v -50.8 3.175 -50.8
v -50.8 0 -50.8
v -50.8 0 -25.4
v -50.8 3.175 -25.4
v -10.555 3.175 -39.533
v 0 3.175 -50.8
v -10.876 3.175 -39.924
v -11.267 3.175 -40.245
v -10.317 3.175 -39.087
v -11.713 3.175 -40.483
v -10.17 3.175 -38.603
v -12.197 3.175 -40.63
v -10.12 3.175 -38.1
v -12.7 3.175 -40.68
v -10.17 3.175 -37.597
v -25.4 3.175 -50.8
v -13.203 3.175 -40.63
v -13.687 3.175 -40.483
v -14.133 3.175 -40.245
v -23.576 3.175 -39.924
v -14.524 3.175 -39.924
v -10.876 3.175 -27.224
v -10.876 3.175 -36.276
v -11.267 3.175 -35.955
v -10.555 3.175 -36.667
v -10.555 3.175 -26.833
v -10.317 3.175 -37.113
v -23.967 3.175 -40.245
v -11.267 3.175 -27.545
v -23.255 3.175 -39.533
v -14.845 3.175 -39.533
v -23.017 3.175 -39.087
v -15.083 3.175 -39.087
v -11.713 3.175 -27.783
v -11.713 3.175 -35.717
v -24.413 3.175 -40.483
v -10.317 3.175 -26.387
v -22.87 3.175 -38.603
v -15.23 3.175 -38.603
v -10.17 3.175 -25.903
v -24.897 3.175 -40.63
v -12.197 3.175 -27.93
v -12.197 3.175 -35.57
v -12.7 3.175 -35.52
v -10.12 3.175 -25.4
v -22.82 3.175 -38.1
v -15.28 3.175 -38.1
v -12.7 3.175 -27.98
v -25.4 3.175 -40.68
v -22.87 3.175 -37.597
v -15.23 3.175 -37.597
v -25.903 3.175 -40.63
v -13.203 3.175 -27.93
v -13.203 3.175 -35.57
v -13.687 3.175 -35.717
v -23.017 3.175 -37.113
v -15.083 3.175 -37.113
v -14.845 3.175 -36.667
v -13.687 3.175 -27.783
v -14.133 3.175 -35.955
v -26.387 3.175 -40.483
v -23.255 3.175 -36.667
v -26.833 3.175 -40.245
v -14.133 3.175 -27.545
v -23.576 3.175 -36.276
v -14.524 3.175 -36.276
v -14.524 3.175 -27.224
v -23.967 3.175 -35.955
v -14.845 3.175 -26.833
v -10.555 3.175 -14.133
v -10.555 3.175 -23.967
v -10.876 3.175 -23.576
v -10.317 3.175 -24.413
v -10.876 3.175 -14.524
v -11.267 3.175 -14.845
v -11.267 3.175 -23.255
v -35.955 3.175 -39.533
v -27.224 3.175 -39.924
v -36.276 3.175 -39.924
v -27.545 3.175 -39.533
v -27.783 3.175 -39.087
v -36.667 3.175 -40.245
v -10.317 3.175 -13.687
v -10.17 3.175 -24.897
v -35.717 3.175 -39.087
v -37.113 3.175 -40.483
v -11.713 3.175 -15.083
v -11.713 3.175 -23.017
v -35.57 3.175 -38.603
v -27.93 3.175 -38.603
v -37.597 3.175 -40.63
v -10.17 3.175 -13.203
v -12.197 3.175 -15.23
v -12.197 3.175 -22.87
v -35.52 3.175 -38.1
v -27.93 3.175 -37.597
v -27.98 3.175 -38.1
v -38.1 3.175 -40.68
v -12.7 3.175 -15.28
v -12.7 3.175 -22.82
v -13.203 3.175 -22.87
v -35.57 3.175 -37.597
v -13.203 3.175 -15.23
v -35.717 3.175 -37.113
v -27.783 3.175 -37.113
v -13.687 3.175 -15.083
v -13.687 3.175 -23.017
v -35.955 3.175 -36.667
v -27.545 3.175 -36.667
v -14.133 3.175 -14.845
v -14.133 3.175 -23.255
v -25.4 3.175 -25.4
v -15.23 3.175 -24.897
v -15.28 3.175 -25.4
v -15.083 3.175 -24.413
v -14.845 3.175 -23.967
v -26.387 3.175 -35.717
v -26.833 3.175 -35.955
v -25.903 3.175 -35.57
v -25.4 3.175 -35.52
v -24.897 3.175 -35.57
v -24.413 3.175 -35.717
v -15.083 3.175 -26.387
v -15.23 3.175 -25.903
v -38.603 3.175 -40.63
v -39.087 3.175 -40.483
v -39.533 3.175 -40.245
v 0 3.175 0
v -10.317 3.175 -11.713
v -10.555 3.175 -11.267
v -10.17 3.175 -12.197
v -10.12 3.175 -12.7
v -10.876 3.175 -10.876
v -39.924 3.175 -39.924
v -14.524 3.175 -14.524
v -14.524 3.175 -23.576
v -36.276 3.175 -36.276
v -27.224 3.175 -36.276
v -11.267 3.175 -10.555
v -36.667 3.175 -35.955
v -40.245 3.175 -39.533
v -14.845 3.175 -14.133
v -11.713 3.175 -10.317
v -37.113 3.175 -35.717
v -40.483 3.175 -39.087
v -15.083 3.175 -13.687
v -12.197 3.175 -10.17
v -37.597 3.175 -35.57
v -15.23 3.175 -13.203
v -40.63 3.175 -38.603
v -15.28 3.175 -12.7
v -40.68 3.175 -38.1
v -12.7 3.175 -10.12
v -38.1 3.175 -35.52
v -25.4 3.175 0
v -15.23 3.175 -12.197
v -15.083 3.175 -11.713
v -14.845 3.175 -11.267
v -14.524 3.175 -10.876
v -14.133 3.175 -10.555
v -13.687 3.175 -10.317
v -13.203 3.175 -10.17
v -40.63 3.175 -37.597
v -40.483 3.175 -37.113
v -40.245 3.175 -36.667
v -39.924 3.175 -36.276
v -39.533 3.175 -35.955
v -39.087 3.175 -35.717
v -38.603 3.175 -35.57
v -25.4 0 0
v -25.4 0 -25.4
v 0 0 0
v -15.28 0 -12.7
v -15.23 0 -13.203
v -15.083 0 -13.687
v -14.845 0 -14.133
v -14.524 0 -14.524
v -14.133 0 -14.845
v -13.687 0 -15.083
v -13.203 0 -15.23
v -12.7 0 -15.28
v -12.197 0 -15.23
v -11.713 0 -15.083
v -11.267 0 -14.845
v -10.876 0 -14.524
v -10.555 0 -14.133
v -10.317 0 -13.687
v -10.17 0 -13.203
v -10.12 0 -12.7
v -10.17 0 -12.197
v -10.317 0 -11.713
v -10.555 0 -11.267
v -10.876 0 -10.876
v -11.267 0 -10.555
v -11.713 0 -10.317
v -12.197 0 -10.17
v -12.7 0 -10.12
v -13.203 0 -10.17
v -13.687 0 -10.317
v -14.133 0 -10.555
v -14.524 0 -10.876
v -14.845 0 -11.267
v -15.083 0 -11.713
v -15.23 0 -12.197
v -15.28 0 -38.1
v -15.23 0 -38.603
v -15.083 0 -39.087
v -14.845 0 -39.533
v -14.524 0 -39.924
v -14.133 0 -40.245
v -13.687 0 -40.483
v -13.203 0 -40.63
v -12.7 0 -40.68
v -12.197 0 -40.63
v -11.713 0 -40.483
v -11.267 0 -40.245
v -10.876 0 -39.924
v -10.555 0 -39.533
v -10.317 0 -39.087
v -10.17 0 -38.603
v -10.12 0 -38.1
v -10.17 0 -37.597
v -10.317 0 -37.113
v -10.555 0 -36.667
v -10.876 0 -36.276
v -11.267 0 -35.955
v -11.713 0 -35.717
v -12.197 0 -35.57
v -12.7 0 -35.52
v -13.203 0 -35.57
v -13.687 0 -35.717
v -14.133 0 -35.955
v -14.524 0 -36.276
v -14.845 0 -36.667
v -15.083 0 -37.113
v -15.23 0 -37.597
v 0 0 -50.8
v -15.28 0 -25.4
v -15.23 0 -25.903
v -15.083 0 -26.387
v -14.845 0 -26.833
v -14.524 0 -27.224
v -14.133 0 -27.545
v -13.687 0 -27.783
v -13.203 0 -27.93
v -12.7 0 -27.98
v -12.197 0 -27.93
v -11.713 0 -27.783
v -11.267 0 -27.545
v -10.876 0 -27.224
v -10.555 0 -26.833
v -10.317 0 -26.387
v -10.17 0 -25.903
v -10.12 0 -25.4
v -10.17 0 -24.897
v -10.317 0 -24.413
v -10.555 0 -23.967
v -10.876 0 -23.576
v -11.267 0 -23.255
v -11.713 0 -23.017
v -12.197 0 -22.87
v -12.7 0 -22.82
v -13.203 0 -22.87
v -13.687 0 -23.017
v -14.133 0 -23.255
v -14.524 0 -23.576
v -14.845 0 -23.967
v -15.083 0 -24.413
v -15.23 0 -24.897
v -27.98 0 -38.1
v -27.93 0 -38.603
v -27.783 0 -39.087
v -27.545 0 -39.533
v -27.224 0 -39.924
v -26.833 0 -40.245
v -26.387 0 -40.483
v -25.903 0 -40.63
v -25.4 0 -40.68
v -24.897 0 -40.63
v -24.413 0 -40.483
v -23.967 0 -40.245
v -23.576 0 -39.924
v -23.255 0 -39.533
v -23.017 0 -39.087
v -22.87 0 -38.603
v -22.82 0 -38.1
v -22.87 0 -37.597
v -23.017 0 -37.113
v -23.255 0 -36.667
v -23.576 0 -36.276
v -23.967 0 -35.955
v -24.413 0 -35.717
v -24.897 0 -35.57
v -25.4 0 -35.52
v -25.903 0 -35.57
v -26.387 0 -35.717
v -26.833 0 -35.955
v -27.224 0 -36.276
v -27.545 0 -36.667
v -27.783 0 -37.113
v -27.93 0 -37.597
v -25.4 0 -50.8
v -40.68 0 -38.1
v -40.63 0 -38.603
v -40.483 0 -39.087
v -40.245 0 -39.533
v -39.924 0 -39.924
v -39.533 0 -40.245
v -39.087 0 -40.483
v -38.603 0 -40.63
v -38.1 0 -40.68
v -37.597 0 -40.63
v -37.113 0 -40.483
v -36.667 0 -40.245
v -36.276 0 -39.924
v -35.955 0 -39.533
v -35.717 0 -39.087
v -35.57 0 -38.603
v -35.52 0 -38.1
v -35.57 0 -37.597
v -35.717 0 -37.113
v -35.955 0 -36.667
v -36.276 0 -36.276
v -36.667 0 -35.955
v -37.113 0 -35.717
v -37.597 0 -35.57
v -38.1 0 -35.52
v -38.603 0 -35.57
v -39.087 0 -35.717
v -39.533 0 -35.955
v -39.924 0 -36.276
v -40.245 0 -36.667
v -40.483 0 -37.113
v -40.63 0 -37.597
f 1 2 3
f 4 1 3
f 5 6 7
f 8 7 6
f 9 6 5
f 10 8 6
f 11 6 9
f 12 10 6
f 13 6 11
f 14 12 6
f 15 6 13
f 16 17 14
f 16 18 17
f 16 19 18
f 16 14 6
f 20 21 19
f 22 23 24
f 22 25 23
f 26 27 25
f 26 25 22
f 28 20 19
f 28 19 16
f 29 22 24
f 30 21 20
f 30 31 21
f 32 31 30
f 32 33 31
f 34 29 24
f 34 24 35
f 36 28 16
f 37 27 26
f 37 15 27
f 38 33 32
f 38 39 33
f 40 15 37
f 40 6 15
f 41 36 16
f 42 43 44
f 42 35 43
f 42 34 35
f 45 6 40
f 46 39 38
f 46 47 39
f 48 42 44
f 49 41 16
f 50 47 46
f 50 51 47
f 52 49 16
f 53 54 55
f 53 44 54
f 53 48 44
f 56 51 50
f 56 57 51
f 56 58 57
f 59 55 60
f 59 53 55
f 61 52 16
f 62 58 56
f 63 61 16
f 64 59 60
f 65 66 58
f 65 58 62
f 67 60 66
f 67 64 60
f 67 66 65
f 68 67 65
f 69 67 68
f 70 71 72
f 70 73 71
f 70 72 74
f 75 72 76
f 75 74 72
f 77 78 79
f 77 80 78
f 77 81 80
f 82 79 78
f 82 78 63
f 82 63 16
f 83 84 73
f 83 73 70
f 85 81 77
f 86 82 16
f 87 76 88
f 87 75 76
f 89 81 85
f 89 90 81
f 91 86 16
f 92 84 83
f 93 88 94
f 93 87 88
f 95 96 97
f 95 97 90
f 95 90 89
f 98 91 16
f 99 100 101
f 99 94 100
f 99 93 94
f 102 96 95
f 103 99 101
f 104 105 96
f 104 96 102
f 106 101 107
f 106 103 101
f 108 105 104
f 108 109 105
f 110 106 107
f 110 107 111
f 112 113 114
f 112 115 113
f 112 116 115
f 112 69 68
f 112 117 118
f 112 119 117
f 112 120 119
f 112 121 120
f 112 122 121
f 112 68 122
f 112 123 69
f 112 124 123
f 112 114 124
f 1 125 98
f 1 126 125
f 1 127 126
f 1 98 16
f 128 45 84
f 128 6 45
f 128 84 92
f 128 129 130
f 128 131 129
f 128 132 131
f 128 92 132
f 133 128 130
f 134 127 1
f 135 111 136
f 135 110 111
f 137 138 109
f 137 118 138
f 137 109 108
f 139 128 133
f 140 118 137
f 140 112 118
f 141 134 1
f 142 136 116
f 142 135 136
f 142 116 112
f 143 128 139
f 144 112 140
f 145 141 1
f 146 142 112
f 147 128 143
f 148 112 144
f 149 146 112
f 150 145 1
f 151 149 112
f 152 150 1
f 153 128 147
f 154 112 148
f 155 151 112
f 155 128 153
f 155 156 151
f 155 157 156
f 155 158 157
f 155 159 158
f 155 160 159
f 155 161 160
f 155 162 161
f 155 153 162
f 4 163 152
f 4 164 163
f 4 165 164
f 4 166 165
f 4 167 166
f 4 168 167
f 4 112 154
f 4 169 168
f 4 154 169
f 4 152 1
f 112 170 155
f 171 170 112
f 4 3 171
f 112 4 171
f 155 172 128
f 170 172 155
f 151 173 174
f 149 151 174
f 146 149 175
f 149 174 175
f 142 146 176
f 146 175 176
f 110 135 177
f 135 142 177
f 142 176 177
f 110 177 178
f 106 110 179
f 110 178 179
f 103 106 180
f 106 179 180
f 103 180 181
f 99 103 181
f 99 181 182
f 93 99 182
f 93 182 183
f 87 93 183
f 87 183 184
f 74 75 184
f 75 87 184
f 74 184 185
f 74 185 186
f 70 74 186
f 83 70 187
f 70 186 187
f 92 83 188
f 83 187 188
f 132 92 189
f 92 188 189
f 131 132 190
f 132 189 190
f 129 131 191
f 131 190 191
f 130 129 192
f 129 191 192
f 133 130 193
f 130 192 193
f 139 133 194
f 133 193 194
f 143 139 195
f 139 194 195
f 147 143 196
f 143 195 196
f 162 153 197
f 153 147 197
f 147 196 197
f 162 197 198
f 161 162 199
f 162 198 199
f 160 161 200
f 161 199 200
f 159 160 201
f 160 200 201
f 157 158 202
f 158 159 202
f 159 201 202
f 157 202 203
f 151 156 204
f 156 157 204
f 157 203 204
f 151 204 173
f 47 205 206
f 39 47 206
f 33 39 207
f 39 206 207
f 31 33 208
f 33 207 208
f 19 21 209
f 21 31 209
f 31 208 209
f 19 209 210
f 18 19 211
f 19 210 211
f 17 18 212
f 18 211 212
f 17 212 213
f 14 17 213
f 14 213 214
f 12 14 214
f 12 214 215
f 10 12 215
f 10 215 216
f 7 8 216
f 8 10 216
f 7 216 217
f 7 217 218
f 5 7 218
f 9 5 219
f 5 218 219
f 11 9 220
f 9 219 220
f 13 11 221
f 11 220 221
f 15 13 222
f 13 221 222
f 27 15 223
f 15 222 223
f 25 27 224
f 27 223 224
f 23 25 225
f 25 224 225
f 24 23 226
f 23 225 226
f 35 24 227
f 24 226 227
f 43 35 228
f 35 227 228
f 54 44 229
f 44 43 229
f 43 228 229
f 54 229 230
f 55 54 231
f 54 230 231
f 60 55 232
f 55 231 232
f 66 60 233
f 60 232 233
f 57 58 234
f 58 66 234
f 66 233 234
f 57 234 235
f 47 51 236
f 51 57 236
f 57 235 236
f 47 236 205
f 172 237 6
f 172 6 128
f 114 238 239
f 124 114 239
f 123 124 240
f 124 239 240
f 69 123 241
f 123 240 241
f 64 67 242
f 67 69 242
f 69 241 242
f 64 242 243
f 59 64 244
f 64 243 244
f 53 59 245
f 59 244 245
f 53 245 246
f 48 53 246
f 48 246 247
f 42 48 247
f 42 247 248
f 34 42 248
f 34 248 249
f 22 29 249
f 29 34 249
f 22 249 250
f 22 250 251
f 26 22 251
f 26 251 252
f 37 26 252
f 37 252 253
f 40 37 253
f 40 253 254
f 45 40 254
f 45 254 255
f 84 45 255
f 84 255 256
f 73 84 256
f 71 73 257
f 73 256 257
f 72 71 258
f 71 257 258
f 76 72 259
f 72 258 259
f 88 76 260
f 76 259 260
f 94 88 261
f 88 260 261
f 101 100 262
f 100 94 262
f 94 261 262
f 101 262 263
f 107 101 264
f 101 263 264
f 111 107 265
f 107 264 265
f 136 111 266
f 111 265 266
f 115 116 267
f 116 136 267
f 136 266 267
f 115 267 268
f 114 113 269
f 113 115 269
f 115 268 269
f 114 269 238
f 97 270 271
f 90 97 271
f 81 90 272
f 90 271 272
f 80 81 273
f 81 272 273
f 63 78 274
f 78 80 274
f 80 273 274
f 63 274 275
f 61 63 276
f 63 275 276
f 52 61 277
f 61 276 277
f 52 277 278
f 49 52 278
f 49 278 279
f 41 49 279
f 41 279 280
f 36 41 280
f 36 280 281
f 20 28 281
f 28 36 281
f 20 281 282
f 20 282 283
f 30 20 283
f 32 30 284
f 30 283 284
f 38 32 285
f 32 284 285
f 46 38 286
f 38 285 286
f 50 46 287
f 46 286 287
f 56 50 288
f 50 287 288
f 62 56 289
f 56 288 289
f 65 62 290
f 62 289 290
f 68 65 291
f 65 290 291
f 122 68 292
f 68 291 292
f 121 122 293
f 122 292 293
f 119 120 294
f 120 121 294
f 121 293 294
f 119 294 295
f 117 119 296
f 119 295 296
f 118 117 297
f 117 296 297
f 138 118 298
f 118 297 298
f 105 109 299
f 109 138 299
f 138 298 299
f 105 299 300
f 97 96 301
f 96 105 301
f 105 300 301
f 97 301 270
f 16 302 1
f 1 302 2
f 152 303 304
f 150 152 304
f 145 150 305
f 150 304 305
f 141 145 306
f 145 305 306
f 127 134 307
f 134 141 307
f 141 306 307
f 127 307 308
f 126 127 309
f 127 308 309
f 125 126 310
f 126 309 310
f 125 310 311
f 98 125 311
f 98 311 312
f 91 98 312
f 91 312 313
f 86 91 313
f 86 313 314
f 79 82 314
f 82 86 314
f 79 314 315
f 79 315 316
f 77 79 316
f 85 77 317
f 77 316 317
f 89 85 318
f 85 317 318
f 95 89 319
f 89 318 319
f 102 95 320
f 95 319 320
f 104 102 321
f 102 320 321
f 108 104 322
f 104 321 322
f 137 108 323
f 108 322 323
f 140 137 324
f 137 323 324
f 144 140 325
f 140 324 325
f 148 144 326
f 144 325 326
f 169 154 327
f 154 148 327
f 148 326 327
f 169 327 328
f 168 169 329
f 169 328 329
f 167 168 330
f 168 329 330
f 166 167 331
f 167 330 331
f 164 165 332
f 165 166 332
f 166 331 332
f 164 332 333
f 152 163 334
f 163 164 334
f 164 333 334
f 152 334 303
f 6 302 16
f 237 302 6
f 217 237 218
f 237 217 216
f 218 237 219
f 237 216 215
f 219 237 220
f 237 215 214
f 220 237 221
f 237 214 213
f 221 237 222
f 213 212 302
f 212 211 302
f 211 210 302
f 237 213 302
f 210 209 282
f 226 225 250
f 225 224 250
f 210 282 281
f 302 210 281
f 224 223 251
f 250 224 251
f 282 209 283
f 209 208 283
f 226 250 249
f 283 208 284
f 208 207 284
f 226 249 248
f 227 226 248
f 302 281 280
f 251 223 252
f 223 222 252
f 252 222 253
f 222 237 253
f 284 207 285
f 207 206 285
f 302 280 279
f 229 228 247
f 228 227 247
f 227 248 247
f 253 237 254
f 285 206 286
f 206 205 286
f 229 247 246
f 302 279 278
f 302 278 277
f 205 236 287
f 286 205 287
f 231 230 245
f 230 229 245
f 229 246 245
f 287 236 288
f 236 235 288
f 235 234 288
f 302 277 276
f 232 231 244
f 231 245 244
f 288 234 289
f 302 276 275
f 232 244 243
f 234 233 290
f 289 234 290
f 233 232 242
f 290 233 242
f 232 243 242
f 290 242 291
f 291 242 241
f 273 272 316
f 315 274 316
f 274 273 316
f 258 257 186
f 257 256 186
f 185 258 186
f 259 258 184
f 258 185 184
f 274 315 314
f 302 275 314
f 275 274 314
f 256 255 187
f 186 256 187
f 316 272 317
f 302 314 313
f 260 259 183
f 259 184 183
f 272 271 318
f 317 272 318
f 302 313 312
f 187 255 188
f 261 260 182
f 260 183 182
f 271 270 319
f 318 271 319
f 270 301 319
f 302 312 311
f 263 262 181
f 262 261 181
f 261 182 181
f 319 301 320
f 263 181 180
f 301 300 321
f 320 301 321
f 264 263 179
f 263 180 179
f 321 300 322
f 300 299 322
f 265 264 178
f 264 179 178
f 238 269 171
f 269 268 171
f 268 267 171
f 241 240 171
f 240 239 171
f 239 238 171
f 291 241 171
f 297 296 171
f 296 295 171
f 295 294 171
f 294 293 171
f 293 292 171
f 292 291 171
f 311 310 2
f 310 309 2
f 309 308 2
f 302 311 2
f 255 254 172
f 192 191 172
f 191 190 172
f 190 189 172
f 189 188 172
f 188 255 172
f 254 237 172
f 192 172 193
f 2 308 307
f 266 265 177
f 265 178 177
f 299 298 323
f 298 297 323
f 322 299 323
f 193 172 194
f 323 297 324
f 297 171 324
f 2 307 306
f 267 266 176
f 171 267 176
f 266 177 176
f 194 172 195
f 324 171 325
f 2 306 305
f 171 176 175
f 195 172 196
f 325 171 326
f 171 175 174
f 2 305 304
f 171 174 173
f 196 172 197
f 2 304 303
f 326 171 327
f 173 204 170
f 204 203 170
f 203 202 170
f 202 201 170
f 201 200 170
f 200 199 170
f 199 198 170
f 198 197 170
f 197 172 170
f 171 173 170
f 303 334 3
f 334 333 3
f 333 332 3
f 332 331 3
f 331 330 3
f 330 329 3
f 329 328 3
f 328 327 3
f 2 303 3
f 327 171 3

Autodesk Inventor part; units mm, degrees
ref_plane "YZ Plane" through (0, 0, 0) normal (1, 0, 0) x (0, 1, 0)
ref_plane "XZ Plane" through (0, 0, 0) normal (0, 1, 0) x (-1, 0, 0)
ref_plane "XY Plane" through (0, 0, 0) normal (0, 0, 1) x (1, 0, 0)
sketch "Sketch1" plane through (0, 0, 0) normal (0, 1, 0) x (-1, 0, 0)
  line L0 (0, 0) -> (25.4, 0)
  line L1 (25.4, 0) -> (25.4, -25.4)
  line L2 (25.4, -50.8) -> (0, -50.8)
  line L3 (0, -50.8) -> (0, 0)
  line L4 (25.4, -50.8) -> (50.8, -50.8)
  line L5 (50.8, -50.8) -> (50.8, -25.4)
  line L6 (50.8, -25.4) -> (25.4, -25.4)
  line L7 (12.7, 0) -> (12.7, -12.7) construction
  line L8 (12.7, -12.7) -> (12.7, -25.4) construction
  line L9 (12.7, -25.4) -> (12.7, -38.1) construction
  line L10 (12.7, -38.1) -> (25.4, -38.1) construction
  line L11 (25.4, -38.1) -> (38.1, -38.1) construction
  line L12 (38.1, -38.1) -> (50.8, -38.1) construction
  circle A0 centre (12.7, -12.7) radius 2.5797
  circle A1 centre (12.7, -25.4) radius 2.5797
  circle A2 centre (12.7, -38.1) radius 2.5797
  circle A3 centre (25.4, -38.1) radius 2.5797
  circle A4 centre (38.1, -38.1) radius 2.5797
  dimension "d0" = 25.4
  dimension "d2" = 25.4
  dimension "d3" = 25.4
  dimension "d4" = 12.7
  dimension "d5" = 12.7
  dimension "d6" = 12.7
  dimension "d7" = 5.1594
  dimension "d8" = 5.1594
  dimension "d9" = 5.1594
  dimension "d10" = 5.1594
  dimension "d11" = 5.1594
extrude "Extrusion1" add sketch "Sketch1" along normal blind 3.175
properties part number "8020 connector"
